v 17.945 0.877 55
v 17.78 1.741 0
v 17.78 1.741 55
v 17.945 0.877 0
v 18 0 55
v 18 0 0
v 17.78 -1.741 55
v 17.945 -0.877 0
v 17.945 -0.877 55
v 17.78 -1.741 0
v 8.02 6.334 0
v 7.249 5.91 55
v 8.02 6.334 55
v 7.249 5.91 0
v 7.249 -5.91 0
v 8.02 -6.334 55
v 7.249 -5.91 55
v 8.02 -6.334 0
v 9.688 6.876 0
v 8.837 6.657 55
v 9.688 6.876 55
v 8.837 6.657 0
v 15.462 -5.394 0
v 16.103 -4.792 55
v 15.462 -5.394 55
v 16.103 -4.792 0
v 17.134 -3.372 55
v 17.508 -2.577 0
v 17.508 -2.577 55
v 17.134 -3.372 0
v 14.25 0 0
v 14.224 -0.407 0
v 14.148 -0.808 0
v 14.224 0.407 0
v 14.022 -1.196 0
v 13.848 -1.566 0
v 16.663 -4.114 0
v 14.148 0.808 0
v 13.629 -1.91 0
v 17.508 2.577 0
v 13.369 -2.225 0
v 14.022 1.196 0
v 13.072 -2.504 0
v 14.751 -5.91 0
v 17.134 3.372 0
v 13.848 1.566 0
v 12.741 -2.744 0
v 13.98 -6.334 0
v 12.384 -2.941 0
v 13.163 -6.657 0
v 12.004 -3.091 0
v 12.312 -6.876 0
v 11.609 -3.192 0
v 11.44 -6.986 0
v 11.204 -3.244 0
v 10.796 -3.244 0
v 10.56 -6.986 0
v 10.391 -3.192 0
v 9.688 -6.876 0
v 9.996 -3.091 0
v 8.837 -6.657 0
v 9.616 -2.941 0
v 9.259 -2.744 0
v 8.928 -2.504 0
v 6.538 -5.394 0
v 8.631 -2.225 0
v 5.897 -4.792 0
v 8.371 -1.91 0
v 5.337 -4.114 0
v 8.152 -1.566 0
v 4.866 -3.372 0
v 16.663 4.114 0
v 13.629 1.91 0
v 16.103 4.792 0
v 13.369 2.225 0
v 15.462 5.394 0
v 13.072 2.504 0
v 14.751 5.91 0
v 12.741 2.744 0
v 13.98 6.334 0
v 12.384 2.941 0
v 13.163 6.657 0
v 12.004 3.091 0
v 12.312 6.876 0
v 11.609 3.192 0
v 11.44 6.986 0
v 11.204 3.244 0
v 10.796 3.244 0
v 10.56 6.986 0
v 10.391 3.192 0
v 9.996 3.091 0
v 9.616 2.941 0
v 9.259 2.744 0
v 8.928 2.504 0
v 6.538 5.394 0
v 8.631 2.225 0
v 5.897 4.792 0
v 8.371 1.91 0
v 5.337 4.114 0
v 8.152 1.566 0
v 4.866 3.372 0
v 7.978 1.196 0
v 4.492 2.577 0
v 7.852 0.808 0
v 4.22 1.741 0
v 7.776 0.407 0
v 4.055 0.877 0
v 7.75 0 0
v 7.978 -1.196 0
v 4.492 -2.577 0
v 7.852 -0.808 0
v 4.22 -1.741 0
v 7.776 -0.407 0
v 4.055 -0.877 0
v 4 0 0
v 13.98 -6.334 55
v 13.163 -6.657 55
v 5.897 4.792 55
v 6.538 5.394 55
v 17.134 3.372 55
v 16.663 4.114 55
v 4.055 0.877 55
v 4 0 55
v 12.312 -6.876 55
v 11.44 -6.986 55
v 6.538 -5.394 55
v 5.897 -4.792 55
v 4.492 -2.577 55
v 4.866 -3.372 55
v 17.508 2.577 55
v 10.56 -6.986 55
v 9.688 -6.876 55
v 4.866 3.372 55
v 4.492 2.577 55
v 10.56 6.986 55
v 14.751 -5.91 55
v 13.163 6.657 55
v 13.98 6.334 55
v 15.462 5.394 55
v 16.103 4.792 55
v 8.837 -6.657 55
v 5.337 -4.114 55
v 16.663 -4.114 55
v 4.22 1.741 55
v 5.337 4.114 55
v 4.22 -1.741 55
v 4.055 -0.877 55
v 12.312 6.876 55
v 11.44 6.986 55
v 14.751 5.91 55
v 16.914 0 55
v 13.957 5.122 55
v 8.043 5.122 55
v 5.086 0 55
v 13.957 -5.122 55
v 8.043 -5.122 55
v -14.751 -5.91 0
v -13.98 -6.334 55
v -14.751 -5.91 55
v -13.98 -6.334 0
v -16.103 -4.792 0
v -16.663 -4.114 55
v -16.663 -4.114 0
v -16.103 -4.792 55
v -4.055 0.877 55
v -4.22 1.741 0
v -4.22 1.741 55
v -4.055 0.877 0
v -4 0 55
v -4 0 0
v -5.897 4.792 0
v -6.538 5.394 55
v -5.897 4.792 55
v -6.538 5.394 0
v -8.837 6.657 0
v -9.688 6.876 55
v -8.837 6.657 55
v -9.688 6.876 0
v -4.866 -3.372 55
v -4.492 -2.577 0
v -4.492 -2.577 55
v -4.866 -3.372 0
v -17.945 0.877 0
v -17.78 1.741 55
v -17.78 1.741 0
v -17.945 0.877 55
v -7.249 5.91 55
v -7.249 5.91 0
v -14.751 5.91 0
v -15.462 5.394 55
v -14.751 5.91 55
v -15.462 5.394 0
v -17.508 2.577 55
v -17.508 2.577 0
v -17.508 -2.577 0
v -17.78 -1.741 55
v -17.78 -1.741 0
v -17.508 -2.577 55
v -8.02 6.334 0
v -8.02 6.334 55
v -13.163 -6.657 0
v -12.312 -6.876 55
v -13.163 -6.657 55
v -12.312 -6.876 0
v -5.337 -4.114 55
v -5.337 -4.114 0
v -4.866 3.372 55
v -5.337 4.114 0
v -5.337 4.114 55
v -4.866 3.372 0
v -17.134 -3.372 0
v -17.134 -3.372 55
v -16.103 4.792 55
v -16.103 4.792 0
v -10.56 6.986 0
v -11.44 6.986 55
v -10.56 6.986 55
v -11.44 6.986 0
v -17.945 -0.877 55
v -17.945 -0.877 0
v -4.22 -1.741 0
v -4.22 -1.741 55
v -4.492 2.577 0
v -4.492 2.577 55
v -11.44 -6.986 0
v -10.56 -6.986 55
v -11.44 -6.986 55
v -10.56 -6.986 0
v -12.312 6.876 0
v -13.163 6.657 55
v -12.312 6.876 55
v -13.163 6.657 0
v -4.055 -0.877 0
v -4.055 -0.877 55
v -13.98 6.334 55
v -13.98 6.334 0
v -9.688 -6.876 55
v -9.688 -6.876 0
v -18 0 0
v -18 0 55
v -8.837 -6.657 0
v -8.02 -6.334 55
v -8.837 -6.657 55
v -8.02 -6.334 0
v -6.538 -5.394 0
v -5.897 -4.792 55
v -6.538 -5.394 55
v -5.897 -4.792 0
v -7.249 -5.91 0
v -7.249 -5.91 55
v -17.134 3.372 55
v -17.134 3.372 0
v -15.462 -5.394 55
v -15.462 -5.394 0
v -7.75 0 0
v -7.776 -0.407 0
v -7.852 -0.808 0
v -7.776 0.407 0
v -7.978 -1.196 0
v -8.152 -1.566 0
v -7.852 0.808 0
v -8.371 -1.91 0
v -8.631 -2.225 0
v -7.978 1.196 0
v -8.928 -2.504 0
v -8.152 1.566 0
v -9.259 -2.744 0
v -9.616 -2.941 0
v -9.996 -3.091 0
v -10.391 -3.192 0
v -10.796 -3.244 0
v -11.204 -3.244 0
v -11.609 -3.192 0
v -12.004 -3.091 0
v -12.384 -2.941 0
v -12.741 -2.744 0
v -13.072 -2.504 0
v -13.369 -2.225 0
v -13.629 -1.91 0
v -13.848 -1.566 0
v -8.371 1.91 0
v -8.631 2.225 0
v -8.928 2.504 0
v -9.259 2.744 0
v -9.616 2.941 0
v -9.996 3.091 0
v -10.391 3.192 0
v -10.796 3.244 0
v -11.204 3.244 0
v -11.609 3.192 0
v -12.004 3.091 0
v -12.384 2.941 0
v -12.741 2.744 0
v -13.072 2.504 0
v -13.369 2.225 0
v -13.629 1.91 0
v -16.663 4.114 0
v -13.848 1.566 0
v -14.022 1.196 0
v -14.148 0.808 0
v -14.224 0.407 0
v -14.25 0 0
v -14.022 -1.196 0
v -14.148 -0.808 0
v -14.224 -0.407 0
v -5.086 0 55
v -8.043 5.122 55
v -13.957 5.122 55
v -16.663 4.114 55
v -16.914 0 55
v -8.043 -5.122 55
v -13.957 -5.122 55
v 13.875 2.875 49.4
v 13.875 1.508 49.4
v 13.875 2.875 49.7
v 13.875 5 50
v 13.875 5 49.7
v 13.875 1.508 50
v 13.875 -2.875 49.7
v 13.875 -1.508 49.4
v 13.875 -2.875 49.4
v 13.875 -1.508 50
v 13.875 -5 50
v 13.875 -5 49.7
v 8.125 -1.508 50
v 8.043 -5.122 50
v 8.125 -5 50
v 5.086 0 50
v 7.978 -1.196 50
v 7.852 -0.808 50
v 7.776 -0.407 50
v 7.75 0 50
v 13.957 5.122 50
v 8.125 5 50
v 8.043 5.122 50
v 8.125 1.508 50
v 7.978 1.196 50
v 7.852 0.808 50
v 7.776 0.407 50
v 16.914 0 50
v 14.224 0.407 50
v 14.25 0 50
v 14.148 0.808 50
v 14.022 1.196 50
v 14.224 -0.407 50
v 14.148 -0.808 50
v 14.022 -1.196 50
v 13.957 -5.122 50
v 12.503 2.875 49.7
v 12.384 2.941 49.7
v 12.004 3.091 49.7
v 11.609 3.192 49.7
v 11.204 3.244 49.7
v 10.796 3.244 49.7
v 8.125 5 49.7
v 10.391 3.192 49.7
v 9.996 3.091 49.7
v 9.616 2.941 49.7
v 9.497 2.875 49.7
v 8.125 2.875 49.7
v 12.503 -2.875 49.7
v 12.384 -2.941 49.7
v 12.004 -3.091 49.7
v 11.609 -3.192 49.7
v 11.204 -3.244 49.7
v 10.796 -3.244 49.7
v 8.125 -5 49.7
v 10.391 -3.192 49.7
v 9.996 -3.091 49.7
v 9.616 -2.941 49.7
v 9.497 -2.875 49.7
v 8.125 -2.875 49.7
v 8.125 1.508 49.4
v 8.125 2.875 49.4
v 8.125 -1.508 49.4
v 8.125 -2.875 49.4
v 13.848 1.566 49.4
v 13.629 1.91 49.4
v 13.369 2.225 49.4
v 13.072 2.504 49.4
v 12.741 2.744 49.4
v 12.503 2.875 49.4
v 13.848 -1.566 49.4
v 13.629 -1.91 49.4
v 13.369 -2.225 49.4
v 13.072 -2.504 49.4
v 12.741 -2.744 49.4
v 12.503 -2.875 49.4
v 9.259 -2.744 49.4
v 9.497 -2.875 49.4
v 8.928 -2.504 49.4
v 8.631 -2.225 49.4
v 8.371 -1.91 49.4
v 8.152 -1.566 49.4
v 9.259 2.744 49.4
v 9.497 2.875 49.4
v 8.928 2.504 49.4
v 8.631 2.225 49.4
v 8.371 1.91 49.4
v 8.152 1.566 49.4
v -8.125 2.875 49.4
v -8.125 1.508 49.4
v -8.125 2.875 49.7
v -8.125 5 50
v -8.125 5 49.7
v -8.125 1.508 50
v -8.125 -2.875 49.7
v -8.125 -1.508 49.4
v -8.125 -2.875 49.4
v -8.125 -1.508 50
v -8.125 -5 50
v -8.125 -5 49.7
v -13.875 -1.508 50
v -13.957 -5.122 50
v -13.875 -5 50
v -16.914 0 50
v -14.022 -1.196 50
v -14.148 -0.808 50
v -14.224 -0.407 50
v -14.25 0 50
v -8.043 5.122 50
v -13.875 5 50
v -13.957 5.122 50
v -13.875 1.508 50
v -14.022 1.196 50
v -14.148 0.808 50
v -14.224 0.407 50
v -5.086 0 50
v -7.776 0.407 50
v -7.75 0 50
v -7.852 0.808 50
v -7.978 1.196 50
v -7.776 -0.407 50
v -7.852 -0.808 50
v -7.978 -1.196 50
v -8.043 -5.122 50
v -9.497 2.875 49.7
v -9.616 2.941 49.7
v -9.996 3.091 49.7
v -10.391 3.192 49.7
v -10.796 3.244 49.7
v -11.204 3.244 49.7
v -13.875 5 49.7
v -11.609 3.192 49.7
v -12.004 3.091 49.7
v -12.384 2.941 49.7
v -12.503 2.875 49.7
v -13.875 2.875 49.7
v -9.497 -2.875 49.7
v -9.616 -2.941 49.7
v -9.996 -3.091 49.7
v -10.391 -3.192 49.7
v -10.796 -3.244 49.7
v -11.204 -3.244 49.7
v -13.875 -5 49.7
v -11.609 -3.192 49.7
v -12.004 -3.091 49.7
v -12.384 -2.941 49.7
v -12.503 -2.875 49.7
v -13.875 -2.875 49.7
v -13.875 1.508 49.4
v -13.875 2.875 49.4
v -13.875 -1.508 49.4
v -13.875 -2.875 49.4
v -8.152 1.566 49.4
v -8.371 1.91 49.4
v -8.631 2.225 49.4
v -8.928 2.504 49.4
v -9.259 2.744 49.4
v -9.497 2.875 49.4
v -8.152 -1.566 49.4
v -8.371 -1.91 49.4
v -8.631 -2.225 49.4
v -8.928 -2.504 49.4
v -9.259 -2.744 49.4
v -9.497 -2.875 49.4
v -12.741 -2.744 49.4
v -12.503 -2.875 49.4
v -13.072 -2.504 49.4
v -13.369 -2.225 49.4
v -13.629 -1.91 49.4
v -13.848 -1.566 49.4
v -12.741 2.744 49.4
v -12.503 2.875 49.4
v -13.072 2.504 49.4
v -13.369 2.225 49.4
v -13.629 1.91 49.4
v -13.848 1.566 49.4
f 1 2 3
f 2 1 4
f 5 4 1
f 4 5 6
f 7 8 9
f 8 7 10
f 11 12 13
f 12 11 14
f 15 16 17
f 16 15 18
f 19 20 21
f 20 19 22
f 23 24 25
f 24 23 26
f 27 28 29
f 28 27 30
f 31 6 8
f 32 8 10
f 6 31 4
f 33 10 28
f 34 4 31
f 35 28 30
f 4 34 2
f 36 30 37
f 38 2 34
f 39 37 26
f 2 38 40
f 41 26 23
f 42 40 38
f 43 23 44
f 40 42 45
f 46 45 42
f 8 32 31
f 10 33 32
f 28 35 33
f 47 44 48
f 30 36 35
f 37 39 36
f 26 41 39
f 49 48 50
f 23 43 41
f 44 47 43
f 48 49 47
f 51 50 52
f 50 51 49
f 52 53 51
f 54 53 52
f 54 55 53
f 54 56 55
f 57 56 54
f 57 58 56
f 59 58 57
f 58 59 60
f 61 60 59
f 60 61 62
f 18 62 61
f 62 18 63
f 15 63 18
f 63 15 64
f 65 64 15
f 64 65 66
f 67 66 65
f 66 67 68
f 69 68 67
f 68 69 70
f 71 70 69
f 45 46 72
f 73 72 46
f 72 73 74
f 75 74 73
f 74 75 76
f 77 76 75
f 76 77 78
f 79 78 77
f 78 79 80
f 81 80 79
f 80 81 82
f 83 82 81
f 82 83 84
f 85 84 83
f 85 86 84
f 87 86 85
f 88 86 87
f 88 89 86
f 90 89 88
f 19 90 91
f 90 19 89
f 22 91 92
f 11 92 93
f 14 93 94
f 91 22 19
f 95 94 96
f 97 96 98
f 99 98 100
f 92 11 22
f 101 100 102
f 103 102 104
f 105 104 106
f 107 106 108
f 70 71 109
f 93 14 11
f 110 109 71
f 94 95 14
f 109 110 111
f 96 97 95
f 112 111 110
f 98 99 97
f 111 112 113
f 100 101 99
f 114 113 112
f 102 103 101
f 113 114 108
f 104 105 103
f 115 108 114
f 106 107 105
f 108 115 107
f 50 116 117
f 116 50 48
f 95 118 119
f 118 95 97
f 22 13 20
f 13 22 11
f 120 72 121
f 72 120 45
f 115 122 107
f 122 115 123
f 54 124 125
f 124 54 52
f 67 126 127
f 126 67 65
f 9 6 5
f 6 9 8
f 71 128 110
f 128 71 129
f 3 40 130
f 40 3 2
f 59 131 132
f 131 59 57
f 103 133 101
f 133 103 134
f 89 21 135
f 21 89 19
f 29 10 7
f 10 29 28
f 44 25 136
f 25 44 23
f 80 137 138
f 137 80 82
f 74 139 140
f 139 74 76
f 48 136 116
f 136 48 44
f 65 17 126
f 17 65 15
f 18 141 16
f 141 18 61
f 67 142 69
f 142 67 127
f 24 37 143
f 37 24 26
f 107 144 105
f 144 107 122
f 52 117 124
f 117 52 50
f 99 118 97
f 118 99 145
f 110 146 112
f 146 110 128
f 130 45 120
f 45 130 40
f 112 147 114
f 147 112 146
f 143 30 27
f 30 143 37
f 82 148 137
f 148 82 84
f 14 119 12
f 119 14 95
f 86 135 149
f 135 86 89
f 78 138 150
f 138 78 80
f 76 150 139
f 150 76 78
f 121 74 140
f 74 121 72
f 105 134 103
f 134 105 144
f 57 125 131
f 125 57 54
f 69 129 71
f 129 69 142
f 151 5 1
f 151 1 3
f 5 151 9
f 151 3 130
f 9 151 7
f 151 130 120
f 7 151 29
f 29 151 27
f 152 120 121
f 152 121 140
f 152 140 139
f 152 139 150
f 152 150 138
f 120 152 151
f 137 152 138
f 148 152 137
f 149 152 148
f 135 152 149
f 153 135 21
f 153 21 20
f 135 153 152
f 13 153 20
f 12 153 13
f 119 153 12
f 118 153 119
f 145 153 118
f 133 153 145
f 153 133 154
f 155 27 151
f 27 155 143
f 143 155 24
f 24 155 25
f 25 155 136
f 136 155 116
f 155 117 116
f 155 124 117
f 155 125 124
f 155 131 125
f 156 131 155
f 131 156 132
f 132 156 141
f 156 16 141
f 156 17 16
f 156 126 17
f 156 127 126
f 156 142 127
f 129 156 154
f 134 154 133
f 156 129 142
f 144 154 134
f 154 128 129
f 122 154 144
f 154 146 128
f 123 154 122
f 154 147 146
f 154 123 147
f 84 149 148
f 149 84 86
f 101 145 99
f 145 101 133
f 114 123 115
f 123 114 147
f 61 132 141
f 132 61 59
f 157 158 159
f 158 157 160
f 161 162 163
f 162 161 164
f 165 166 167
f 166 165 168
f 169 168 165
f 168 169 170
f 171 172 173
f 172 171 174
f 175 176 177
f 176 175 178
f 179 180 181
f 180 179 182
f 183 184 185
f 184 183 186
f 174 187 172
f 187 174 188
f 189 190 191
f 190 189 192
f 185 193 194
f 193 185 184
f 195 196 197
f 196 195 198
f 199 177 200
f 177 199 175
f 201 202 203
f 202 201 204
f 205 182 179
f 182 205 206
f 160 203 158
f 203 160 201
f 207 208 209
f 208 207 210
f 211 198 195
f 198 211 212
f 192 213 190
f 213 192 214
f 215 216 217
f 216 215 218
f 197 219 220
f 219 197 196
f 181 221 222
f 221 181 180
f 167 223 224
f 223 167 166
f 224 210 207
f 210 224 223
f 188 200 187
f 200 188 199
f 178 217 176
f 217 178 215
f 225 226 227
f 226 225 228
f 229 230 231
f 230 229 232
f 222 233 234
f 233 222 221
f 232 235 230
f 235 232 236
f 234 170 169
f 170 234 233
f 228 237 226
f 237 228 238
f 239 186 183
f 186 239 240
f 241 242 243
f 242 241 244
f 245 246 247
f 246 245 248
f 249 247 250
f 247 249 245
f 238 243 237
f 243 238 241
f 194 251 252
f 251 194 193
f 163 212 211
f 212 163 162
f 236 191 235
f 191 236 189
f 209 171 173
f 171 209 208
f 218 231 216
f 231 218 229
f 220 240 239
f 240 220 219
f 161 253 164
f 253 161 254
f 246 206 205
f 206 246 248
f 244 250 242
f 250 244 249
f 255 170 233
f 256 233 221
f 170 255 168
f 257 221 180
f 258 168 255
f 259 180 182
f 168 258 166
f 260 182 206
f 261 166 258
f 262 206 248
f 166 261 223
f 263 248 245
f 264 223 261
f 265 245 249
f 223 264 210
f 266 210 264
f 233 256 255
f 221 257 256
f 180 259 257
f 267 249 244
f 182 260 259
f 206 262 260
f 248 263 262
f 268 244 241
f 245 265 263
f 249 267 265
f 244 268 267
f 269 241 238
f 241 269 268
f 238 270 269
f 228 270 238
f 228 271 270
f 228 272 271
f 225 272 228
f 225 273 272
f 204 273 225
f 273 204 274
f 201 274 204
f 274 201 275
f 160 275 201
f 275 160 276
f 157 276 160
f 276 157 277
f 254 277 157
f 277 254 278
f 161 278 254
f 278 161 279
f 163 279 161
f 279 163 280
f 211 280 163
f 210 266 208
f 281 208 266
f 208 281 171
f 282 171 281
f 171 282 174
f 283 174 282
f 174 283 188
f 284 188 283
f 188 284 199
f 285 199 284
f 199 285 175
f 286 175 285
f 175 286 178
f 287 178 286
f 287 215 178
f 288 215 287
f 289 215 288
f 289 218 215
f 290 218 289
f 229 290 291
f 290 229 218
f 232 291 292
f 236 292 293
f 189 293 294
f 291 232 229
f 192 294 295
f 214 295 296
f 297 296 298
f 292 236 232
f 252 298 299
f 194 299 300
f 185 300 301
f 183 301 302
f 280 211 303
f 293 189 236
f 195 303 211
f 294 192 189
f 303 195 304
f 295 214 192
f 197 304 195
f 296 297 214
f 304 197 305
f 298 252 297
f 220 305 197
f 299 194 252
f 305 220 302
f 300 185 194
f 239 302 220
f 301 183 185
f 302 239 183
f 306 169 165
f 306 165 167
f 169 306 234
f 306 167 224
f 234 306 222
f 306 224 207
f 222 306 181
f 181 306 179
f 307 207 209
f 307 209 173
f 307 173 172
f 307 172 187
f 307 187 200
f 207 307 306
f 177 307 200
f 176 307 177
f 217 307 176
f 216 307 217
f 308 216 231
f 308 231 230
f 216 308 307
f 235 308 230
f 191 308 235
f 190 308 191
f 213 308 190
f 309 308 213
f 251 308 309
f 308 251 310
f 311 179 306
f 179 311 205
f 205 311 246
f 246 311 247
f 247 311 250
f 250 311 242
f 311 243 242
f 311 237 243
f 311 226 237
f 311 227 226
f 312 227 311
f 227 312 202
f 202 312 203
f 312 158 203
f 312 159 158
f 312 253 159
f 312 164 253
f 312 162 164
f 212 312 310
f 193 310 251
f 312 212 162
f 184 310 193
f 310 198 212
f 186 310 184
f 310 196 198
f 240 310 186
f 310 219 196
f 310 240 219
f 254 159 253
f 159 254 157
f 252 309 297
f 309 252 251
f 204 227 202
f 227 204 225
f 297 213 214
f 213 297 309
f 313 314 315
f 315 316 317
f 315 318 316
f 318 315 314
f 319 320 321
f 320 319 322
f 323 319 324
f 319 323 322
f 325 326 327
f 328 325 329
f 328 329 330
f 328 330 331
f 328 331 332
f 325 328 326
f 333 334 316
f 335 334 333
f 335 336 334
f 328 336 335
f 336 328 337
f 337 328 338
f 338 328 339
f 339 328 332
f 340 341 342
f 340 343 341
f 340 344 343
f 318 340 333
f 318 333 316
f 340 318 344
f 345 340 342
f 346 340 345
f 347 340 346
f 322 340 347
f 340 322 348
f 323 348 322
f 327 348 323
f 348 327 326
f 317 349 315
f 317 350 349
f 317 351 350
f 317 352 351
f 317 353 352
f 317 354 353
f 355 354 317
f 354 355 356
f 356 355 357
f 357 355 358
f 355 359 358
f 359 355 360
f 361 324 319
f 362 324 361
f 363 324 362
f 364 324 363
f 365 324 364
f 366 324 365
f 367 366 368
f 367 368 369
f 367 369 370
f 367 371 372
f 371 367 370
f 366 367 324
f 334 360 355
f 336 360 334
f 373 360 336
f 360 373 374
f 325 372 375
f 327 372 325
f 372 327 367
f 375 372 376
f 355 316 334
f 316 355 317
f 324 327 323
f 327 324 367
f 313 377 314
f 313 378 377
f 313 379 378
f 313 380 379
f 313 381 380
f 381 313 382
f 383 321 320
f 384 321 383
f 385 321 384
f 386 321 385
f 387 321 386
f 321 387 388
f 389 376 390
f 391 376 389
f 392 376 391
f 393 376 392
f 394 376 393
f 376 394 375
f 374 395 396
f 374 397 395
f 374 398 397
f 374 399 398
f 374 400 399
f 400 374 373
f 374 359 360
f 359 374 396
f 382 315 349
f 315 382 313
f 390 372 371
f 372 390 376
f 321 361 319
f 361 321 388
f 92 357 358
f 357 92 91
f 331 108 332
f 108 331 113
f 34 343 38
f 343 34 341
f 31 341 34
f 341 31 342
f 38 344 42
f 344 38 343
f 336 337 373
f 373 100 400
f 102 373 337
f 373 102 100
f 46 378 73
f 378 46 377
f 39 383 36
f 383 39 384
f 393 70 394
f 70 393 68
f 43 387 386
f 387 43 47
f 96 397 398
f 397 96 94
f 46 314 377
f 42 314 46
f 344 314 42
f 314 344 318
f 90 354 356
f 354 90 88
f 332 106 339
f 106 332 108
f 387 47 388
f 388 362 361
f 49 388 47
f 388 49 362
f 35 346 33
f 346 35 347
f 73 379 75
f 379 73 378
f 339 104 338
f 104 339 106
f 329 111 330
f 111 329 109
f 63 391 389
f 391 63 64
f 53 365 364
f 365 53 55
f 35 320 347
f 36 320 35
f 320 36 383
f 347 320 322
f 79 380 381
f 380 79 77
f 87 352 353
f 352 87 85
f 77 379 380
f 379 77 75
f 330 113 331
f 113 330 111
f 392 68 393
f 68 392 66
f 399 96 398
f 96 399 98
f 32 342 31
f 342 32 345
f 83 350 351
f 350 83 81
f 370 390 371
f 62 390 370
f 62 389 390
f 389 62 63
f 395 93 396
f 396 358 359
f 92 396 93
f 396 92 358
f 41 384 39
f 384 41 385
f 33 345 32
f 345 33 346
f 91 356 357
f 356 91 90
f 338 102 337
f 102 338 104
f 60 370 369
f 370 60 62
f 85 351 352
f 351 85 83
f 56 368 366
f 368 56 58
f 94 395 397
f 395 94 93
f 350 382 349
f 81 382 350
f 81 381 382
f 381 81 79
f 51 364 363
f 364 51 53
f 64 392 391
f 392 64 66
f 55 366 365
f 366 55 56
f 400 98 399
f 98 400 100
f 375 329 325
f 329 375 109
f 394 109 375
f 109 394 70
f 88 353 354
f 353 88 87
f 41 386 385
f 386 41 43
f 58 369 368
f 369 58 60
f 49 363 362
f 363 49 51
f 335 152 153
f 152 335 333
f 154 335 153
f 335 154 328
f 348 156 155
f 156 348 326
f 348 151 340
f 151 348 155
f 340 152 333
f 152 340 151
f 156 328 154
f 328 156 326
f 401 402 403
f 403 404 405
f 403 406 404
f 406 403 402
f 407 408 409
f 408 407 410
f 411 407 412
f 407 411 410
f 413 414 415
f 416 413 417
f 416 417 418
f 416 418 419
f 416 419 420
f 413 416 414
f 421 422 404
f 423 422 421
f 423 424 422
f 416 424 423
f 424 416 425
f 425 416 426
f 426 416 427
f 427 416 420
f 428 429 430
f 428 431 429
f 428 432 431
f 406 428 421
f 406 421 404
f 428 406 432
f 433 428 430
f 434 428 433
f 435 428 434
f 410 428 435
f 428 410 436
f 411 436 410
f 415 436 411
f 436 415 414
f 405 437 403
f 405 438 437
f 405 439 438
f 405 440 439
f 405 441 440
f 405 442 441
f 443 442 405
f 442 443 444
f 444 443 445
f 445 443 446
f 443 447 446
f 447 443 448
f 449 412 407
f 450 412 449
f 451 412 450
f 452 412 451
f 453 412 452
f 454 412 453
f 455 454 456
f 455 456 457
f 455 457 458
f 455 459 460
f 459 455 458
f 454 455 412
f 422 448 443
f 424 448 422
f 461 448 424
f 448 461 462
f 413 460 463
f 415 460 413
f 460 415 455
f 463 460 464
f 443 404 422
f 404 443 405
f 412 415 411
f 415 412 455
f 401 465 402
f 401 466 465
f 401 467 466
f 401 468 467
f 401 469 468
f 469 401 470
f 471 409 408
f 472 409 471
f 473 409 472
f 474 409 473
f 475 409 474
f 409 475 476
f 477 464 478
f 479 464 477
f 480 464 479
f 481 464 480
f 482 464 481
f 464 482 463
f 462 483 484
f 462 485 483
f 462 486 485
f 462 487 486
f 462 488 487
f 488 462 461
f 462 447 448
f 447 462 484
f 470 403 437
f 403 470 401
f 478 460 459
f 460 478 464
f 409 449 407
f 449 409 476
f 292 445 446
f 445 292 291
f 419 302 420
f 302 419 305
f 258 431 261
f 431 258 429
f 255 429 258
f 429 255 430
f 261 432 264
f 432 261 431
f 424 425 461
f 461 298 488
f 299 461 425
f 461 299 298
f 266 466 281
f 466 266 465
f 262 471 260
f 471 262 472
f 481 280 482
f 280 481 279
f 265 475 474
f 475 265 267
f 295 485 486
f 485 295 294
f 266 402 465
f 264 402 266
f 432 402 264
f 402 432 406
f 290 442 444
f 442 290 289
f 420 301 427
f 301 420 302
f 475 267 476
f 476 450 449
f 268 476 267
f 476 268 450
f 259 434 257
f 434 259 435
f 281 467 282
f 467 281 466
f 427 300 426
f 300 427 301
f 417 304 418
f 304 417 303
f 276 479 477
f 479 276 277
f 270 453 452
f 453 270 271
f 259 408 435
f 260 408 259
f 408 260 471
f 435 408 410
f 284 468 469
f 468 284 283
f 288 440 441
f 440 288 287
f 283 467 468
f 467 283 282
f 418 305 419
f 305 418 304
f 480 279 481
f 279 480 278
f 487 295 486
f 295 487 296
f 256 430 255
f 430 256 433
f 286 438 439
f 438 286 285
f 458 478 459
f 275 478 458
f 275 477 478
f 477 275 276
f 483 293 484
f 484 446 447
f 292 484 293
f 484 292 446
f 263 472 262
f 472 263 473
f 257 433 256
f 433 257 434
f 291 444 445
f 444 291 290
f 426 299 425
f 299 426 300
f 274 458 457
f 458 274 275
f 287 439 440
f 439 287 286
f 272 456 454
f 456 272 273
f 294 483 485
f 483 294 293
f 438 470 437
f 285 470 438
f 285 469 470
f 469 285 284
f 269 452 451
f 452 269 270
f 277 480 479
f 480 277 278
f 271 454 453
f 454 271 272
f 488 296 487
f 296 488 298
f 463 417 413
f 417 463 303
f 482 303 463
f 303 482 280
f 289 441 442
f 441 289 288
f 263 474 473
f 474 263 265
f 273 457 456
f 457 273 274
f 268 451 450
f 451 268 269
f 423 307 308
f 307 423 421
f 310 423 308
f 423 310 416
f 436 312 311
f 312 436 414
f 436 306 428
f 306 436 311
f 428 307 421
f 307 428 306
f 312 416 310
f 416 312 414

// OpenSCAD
$fn = 50;


difference() {
	union() {
		translate(v = [11.0000000000, 0, 0.0000000000]) {
			cylinder(h = 55, r = 7.0000000000);
		}
		translate(v = [-11.0000000000, 0, 0.0000000000]) {
			cylinder(h = 55, r = 7.0000000000);
		}
	}
	union() {
		translate(v = [11.0000000000, 0, 55]) {
			rotate(a = [0, 0, 0]) {
				difference() {
					union() {
						#translate(v = [-2.8750000000, -5.0000000000, -5.3000000000]) {
							cube(size = [5.7500000000, 10, 0.3000000000]);
						}
						#translate(v = [-2.8750000000, -2.8750000000, -5.6000000000]) {
							cube(size = [5.7500000000, 5.7500000000, 0.3000000000]);
						}
						#translate(v = [-2.8750000000, -5.0000000000, 0]) {
							cube(size = [5.7500000000, 10, 0.3000000000]);
						}
						#translate(v = [-2.8750000000, -2.8750000000, 0.3000000000]) {
							cube(size = [5.7500000000, 5.7500000000, 0.3000000000]);
						}
						#translate(v = [0, 0, -100.0000000000]) {
							cylinder(h = 200, r = 3.2500000000);
						}
						translate(v = [0, 0, -5]) {
							#linear_extrude(height = 5) {
								polygon(points = [[5.9142500000, 0.0000000000], [2.9571250000, 5.1218907443], [-2.9571250000, 5.1218907443], [-5.9142500000, 0.0000000000], [-2.9571250000, -5.1218907443], [2.9571250000, -5.1218907443]]);
							}
						}
						#translate(v = [-2.8750000000, -5.0000000000, -5.3000000000]) {
							cube(size = [5.7500000000, 10, 0.3000000000]);
						}
						#translate(v = [-2.8750000000, -2.8750000000, -5.6000000000]) {
							cube(size = [5.7500000000, 5.7500000000, 0.3000000000]);
						}
						#translate(v = [-2.8750000000, -5.0000000000, 0]) {
							cube(size = [5.7500000000, 10, 0.3000000000]);
						}
						#translate(v = [-2.8750000000, -2.8750000000, 0.3000000000]) {
							cube(size = [5.7500000000, 5.7500000000, 0.3000000000]);
						}
						#translate(v = [0, 0, -100.0000000000]) {
							cylinder(h = 200, r = 3.2500000000);
						}
						#translate(v = [-2.8750000000, -5.0000000000, -5.3000000000]) {
							cube(size = [5.7500000000, 10, 0.3000000000]);
						}
						#translate(v = [-2.8750000000, -2.8750000000, -5.6000000000]) {
							cube(size = [5.7500000000, 5.7500000000, 0.3000000000]);
						}
						#translate(v = [-2.8750000000, -5.0000000000, 0]) {
							cube(size = [5.7500000000, 10, 0.3000000000]);
						}
						#translate(v = [-2.8750000000, -2.8750000000, 0.3000000000]) {
							cube(size = [5.7500000000, 5.7500000000, 0.3000000000]);
						}
						#translate(v = [0, 0, -100.0000000000]) {
							cylinder(h = 200, r = 3.2500000000);
						}
					}
					union();
				}
			}
		}
		translate(v = [-11.0000000000, 0, 55]) {
			rotate(a = [0, 0, 0]) {
				difference() {
					union() {
						#translate(v = [-2.8750000000, -5.0000000000, -5.3000000000]) {
							cube(size = [5.7500000000, 10, 0.3000000000]);
						}
						#translate(v = [-2.8750000000, -2.8750000000, -5.6000000000]) {
							cube(size = [5.7500000000, 5.7500000000, 0.3000000000]);
						}
						#translate(v = [-2.8750000000, -5.0000000000, 0]) {
							cube(size = [5.7500000000, 10, 0.3000000000]);
						}
						#translate(v = [-2.8750000000, -2.8750000000, 0.3000000000]) {
							cube(size = [5.7500000000, 5.7500000000, 0.3000000000]);
						}
						#translate(v = [0, 0, -100.0000000000]) {
							cylinder(h = 200, r = 3.2500000000);
						}
						translate(v = [0, 0, -5]) {
							#linear_extrude(height = 5) {
								polygon(points = [[5.9142500000, 0.0000000000], [2.9571250000, 5.1218907443], [-2.9571250000, 5.1218907443], [-5.9142500000, 0.0000000000], [-2.9571250000, -5.1218907443], [2.9571250000, -5.1218907443]]);
							}
						}
						#translate(v = [-2.8750000000, -5.0000000000, -5.3000000000]) {
							cube(size = [5.7500000000, 10, 0.3000000000]);
						}
						#translate(v = [-2.8750000000, -2.8750000000, -5.6000000000]) {
							cube(size = [5.7500000000, 5.7500000000, 0.3000000000]);
						}
						#translate(v = [-2.8750000000, -5.0000000000, 0]) {
							cube(size = [5.7500000000, 10, 0.3000000000]);
						}
						#translate(v = [-2.8750000000, -2.8750000000, 0.3000000000]) {
							cube(size = [5.7500000000, 5.7500000000, 0.3000000000]);
						}
						#translate(v = [0, 0, -100.0000000000]) {
							cylinder(h = 200, r = 3.2500000000);
						}
						#translate(v = [-2.8750000000, -5.0000000000, -5.3000000000]) {
							cube(size = [5.7500000000, 10, 0.3000000000]);
						}
						#translate(v = [-2.8750000000, -2.8750000000, -5.6000000000]) {
							cube(size = [5.7500000000, 5.7500000000, 0.3000000000]);
						}
						#translate(v = [-2.8750000000, -5.0000000000, 0]) {
							cube(size = [5.7500000000, 10, 0.3000000000]);
						}
						#translate(v = [-2.8750000000, -2.8750000000, 0.3000000000]) {
							cube(size = [5.7500000000, 5.7500000000, 0.3000000000]);
						}
						#translate(v = [0, 0, -100.0000000000]) {
							cylinder(h = 200, r = 3.2500000000);
						}
					}
					union();
				}
			}
		}
	}
}
